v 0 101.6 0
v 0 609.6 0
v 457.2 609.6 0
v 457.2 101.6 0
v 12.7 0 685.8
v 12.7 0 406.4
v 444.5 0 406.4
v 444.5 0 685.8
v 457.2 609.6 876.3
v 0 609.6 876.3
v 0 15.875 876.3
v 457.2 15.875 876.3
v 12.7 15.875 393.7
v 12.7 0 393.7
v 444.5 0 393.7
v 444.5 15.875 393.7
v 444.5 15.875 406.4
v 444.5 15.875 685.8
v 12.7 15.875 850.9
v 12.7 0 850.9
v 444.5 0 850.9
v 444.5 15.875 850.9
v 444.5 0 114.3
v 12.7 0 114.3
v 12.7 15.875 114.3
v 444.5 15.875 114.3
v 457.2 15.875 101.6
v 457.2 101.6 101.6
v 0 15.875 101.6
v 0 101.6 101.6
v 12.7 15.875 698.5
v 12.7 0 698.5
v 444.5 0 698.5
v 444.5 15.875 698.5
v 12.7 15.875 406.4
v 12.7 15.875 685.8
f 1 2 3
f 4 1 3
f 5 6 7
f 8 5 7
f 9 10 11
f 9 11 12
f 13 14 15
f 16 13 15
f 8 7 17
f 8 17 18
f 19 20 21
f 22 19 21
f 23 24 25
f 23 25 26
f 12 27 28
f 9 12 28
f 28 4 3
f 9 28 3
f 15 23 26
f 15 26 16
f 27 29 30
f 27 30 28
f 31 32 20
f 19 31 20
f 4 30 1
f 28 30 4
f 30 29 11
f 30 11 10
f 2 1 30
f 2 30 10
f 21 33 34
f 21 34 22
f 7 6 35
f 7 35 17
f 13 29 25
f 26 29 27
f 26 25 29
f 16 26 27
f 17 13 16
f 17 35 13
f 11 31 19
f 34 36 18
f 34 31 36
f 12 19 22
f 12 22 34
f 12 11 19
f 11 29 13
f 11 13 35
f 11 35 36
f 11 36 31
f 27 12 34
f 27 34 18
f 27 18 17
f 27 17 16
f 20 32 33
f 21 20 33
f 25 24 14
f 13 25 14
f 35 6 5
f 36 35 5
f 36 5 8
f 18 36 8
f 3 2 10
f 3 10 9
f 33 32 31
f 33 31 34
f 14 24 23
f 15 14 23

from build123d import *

# Parameters (mm, degrees)
F0_W     = 457.2
F0_H     = 609.6
F1_DEPTH = 876.3
F2_W     = 457.2
F2_H     = 101.6
F3_DEPTH = 101.6
F4_W     = 457.2
F4_H     = 774.7
F4_W_2   = 431.8
F4_H_2   = 279.4
F4_H_3   = 152.4
F5_DEPTH = 15.875


with BuildPart() as f1:
    # F0 (on Top) → F1 (new body)
    with BuildSketch(Plane.XY):
        with Locations((228.6, 304.8)):
            Rectangle(F0_W, F0_H)
    extrude(amount=F1_DEPTH)

    # F2 (on face) → F3 (cut)
    with BuildSketch(Plane.XZ):
        with Locations((228.6, 50.8)):
            Rectangle(F2_W, F2_H)
    extrude(amount=-F3_DEPTH, mode=Mode.SUBTRACT)

    # F4 (on face) → F5 (cut)
    with BuildSketch(Plane.XZ):
        with Locations((228.6, 488.95)):
            Rectangle(F4_W, F4_H)
        with Locations((228.6, 254)):
            Rectangle(F4_W_2, F4_H_2, mode=Mode.SUBTRACT)
        with Locations((228.6, 546.1)):
            Rectangle(F4_W_2, F4_H_2, mode=Mode.SUBTRACT)
        with Locations((228.6, 774.7)):
            Rectangle(F4_W_2, F4_H_3, mode=Mode.SUBTRACT)
    extrude(amount=-F5_DEPTH, mode=Mode.SUBTRACT)


solid = f1.part
